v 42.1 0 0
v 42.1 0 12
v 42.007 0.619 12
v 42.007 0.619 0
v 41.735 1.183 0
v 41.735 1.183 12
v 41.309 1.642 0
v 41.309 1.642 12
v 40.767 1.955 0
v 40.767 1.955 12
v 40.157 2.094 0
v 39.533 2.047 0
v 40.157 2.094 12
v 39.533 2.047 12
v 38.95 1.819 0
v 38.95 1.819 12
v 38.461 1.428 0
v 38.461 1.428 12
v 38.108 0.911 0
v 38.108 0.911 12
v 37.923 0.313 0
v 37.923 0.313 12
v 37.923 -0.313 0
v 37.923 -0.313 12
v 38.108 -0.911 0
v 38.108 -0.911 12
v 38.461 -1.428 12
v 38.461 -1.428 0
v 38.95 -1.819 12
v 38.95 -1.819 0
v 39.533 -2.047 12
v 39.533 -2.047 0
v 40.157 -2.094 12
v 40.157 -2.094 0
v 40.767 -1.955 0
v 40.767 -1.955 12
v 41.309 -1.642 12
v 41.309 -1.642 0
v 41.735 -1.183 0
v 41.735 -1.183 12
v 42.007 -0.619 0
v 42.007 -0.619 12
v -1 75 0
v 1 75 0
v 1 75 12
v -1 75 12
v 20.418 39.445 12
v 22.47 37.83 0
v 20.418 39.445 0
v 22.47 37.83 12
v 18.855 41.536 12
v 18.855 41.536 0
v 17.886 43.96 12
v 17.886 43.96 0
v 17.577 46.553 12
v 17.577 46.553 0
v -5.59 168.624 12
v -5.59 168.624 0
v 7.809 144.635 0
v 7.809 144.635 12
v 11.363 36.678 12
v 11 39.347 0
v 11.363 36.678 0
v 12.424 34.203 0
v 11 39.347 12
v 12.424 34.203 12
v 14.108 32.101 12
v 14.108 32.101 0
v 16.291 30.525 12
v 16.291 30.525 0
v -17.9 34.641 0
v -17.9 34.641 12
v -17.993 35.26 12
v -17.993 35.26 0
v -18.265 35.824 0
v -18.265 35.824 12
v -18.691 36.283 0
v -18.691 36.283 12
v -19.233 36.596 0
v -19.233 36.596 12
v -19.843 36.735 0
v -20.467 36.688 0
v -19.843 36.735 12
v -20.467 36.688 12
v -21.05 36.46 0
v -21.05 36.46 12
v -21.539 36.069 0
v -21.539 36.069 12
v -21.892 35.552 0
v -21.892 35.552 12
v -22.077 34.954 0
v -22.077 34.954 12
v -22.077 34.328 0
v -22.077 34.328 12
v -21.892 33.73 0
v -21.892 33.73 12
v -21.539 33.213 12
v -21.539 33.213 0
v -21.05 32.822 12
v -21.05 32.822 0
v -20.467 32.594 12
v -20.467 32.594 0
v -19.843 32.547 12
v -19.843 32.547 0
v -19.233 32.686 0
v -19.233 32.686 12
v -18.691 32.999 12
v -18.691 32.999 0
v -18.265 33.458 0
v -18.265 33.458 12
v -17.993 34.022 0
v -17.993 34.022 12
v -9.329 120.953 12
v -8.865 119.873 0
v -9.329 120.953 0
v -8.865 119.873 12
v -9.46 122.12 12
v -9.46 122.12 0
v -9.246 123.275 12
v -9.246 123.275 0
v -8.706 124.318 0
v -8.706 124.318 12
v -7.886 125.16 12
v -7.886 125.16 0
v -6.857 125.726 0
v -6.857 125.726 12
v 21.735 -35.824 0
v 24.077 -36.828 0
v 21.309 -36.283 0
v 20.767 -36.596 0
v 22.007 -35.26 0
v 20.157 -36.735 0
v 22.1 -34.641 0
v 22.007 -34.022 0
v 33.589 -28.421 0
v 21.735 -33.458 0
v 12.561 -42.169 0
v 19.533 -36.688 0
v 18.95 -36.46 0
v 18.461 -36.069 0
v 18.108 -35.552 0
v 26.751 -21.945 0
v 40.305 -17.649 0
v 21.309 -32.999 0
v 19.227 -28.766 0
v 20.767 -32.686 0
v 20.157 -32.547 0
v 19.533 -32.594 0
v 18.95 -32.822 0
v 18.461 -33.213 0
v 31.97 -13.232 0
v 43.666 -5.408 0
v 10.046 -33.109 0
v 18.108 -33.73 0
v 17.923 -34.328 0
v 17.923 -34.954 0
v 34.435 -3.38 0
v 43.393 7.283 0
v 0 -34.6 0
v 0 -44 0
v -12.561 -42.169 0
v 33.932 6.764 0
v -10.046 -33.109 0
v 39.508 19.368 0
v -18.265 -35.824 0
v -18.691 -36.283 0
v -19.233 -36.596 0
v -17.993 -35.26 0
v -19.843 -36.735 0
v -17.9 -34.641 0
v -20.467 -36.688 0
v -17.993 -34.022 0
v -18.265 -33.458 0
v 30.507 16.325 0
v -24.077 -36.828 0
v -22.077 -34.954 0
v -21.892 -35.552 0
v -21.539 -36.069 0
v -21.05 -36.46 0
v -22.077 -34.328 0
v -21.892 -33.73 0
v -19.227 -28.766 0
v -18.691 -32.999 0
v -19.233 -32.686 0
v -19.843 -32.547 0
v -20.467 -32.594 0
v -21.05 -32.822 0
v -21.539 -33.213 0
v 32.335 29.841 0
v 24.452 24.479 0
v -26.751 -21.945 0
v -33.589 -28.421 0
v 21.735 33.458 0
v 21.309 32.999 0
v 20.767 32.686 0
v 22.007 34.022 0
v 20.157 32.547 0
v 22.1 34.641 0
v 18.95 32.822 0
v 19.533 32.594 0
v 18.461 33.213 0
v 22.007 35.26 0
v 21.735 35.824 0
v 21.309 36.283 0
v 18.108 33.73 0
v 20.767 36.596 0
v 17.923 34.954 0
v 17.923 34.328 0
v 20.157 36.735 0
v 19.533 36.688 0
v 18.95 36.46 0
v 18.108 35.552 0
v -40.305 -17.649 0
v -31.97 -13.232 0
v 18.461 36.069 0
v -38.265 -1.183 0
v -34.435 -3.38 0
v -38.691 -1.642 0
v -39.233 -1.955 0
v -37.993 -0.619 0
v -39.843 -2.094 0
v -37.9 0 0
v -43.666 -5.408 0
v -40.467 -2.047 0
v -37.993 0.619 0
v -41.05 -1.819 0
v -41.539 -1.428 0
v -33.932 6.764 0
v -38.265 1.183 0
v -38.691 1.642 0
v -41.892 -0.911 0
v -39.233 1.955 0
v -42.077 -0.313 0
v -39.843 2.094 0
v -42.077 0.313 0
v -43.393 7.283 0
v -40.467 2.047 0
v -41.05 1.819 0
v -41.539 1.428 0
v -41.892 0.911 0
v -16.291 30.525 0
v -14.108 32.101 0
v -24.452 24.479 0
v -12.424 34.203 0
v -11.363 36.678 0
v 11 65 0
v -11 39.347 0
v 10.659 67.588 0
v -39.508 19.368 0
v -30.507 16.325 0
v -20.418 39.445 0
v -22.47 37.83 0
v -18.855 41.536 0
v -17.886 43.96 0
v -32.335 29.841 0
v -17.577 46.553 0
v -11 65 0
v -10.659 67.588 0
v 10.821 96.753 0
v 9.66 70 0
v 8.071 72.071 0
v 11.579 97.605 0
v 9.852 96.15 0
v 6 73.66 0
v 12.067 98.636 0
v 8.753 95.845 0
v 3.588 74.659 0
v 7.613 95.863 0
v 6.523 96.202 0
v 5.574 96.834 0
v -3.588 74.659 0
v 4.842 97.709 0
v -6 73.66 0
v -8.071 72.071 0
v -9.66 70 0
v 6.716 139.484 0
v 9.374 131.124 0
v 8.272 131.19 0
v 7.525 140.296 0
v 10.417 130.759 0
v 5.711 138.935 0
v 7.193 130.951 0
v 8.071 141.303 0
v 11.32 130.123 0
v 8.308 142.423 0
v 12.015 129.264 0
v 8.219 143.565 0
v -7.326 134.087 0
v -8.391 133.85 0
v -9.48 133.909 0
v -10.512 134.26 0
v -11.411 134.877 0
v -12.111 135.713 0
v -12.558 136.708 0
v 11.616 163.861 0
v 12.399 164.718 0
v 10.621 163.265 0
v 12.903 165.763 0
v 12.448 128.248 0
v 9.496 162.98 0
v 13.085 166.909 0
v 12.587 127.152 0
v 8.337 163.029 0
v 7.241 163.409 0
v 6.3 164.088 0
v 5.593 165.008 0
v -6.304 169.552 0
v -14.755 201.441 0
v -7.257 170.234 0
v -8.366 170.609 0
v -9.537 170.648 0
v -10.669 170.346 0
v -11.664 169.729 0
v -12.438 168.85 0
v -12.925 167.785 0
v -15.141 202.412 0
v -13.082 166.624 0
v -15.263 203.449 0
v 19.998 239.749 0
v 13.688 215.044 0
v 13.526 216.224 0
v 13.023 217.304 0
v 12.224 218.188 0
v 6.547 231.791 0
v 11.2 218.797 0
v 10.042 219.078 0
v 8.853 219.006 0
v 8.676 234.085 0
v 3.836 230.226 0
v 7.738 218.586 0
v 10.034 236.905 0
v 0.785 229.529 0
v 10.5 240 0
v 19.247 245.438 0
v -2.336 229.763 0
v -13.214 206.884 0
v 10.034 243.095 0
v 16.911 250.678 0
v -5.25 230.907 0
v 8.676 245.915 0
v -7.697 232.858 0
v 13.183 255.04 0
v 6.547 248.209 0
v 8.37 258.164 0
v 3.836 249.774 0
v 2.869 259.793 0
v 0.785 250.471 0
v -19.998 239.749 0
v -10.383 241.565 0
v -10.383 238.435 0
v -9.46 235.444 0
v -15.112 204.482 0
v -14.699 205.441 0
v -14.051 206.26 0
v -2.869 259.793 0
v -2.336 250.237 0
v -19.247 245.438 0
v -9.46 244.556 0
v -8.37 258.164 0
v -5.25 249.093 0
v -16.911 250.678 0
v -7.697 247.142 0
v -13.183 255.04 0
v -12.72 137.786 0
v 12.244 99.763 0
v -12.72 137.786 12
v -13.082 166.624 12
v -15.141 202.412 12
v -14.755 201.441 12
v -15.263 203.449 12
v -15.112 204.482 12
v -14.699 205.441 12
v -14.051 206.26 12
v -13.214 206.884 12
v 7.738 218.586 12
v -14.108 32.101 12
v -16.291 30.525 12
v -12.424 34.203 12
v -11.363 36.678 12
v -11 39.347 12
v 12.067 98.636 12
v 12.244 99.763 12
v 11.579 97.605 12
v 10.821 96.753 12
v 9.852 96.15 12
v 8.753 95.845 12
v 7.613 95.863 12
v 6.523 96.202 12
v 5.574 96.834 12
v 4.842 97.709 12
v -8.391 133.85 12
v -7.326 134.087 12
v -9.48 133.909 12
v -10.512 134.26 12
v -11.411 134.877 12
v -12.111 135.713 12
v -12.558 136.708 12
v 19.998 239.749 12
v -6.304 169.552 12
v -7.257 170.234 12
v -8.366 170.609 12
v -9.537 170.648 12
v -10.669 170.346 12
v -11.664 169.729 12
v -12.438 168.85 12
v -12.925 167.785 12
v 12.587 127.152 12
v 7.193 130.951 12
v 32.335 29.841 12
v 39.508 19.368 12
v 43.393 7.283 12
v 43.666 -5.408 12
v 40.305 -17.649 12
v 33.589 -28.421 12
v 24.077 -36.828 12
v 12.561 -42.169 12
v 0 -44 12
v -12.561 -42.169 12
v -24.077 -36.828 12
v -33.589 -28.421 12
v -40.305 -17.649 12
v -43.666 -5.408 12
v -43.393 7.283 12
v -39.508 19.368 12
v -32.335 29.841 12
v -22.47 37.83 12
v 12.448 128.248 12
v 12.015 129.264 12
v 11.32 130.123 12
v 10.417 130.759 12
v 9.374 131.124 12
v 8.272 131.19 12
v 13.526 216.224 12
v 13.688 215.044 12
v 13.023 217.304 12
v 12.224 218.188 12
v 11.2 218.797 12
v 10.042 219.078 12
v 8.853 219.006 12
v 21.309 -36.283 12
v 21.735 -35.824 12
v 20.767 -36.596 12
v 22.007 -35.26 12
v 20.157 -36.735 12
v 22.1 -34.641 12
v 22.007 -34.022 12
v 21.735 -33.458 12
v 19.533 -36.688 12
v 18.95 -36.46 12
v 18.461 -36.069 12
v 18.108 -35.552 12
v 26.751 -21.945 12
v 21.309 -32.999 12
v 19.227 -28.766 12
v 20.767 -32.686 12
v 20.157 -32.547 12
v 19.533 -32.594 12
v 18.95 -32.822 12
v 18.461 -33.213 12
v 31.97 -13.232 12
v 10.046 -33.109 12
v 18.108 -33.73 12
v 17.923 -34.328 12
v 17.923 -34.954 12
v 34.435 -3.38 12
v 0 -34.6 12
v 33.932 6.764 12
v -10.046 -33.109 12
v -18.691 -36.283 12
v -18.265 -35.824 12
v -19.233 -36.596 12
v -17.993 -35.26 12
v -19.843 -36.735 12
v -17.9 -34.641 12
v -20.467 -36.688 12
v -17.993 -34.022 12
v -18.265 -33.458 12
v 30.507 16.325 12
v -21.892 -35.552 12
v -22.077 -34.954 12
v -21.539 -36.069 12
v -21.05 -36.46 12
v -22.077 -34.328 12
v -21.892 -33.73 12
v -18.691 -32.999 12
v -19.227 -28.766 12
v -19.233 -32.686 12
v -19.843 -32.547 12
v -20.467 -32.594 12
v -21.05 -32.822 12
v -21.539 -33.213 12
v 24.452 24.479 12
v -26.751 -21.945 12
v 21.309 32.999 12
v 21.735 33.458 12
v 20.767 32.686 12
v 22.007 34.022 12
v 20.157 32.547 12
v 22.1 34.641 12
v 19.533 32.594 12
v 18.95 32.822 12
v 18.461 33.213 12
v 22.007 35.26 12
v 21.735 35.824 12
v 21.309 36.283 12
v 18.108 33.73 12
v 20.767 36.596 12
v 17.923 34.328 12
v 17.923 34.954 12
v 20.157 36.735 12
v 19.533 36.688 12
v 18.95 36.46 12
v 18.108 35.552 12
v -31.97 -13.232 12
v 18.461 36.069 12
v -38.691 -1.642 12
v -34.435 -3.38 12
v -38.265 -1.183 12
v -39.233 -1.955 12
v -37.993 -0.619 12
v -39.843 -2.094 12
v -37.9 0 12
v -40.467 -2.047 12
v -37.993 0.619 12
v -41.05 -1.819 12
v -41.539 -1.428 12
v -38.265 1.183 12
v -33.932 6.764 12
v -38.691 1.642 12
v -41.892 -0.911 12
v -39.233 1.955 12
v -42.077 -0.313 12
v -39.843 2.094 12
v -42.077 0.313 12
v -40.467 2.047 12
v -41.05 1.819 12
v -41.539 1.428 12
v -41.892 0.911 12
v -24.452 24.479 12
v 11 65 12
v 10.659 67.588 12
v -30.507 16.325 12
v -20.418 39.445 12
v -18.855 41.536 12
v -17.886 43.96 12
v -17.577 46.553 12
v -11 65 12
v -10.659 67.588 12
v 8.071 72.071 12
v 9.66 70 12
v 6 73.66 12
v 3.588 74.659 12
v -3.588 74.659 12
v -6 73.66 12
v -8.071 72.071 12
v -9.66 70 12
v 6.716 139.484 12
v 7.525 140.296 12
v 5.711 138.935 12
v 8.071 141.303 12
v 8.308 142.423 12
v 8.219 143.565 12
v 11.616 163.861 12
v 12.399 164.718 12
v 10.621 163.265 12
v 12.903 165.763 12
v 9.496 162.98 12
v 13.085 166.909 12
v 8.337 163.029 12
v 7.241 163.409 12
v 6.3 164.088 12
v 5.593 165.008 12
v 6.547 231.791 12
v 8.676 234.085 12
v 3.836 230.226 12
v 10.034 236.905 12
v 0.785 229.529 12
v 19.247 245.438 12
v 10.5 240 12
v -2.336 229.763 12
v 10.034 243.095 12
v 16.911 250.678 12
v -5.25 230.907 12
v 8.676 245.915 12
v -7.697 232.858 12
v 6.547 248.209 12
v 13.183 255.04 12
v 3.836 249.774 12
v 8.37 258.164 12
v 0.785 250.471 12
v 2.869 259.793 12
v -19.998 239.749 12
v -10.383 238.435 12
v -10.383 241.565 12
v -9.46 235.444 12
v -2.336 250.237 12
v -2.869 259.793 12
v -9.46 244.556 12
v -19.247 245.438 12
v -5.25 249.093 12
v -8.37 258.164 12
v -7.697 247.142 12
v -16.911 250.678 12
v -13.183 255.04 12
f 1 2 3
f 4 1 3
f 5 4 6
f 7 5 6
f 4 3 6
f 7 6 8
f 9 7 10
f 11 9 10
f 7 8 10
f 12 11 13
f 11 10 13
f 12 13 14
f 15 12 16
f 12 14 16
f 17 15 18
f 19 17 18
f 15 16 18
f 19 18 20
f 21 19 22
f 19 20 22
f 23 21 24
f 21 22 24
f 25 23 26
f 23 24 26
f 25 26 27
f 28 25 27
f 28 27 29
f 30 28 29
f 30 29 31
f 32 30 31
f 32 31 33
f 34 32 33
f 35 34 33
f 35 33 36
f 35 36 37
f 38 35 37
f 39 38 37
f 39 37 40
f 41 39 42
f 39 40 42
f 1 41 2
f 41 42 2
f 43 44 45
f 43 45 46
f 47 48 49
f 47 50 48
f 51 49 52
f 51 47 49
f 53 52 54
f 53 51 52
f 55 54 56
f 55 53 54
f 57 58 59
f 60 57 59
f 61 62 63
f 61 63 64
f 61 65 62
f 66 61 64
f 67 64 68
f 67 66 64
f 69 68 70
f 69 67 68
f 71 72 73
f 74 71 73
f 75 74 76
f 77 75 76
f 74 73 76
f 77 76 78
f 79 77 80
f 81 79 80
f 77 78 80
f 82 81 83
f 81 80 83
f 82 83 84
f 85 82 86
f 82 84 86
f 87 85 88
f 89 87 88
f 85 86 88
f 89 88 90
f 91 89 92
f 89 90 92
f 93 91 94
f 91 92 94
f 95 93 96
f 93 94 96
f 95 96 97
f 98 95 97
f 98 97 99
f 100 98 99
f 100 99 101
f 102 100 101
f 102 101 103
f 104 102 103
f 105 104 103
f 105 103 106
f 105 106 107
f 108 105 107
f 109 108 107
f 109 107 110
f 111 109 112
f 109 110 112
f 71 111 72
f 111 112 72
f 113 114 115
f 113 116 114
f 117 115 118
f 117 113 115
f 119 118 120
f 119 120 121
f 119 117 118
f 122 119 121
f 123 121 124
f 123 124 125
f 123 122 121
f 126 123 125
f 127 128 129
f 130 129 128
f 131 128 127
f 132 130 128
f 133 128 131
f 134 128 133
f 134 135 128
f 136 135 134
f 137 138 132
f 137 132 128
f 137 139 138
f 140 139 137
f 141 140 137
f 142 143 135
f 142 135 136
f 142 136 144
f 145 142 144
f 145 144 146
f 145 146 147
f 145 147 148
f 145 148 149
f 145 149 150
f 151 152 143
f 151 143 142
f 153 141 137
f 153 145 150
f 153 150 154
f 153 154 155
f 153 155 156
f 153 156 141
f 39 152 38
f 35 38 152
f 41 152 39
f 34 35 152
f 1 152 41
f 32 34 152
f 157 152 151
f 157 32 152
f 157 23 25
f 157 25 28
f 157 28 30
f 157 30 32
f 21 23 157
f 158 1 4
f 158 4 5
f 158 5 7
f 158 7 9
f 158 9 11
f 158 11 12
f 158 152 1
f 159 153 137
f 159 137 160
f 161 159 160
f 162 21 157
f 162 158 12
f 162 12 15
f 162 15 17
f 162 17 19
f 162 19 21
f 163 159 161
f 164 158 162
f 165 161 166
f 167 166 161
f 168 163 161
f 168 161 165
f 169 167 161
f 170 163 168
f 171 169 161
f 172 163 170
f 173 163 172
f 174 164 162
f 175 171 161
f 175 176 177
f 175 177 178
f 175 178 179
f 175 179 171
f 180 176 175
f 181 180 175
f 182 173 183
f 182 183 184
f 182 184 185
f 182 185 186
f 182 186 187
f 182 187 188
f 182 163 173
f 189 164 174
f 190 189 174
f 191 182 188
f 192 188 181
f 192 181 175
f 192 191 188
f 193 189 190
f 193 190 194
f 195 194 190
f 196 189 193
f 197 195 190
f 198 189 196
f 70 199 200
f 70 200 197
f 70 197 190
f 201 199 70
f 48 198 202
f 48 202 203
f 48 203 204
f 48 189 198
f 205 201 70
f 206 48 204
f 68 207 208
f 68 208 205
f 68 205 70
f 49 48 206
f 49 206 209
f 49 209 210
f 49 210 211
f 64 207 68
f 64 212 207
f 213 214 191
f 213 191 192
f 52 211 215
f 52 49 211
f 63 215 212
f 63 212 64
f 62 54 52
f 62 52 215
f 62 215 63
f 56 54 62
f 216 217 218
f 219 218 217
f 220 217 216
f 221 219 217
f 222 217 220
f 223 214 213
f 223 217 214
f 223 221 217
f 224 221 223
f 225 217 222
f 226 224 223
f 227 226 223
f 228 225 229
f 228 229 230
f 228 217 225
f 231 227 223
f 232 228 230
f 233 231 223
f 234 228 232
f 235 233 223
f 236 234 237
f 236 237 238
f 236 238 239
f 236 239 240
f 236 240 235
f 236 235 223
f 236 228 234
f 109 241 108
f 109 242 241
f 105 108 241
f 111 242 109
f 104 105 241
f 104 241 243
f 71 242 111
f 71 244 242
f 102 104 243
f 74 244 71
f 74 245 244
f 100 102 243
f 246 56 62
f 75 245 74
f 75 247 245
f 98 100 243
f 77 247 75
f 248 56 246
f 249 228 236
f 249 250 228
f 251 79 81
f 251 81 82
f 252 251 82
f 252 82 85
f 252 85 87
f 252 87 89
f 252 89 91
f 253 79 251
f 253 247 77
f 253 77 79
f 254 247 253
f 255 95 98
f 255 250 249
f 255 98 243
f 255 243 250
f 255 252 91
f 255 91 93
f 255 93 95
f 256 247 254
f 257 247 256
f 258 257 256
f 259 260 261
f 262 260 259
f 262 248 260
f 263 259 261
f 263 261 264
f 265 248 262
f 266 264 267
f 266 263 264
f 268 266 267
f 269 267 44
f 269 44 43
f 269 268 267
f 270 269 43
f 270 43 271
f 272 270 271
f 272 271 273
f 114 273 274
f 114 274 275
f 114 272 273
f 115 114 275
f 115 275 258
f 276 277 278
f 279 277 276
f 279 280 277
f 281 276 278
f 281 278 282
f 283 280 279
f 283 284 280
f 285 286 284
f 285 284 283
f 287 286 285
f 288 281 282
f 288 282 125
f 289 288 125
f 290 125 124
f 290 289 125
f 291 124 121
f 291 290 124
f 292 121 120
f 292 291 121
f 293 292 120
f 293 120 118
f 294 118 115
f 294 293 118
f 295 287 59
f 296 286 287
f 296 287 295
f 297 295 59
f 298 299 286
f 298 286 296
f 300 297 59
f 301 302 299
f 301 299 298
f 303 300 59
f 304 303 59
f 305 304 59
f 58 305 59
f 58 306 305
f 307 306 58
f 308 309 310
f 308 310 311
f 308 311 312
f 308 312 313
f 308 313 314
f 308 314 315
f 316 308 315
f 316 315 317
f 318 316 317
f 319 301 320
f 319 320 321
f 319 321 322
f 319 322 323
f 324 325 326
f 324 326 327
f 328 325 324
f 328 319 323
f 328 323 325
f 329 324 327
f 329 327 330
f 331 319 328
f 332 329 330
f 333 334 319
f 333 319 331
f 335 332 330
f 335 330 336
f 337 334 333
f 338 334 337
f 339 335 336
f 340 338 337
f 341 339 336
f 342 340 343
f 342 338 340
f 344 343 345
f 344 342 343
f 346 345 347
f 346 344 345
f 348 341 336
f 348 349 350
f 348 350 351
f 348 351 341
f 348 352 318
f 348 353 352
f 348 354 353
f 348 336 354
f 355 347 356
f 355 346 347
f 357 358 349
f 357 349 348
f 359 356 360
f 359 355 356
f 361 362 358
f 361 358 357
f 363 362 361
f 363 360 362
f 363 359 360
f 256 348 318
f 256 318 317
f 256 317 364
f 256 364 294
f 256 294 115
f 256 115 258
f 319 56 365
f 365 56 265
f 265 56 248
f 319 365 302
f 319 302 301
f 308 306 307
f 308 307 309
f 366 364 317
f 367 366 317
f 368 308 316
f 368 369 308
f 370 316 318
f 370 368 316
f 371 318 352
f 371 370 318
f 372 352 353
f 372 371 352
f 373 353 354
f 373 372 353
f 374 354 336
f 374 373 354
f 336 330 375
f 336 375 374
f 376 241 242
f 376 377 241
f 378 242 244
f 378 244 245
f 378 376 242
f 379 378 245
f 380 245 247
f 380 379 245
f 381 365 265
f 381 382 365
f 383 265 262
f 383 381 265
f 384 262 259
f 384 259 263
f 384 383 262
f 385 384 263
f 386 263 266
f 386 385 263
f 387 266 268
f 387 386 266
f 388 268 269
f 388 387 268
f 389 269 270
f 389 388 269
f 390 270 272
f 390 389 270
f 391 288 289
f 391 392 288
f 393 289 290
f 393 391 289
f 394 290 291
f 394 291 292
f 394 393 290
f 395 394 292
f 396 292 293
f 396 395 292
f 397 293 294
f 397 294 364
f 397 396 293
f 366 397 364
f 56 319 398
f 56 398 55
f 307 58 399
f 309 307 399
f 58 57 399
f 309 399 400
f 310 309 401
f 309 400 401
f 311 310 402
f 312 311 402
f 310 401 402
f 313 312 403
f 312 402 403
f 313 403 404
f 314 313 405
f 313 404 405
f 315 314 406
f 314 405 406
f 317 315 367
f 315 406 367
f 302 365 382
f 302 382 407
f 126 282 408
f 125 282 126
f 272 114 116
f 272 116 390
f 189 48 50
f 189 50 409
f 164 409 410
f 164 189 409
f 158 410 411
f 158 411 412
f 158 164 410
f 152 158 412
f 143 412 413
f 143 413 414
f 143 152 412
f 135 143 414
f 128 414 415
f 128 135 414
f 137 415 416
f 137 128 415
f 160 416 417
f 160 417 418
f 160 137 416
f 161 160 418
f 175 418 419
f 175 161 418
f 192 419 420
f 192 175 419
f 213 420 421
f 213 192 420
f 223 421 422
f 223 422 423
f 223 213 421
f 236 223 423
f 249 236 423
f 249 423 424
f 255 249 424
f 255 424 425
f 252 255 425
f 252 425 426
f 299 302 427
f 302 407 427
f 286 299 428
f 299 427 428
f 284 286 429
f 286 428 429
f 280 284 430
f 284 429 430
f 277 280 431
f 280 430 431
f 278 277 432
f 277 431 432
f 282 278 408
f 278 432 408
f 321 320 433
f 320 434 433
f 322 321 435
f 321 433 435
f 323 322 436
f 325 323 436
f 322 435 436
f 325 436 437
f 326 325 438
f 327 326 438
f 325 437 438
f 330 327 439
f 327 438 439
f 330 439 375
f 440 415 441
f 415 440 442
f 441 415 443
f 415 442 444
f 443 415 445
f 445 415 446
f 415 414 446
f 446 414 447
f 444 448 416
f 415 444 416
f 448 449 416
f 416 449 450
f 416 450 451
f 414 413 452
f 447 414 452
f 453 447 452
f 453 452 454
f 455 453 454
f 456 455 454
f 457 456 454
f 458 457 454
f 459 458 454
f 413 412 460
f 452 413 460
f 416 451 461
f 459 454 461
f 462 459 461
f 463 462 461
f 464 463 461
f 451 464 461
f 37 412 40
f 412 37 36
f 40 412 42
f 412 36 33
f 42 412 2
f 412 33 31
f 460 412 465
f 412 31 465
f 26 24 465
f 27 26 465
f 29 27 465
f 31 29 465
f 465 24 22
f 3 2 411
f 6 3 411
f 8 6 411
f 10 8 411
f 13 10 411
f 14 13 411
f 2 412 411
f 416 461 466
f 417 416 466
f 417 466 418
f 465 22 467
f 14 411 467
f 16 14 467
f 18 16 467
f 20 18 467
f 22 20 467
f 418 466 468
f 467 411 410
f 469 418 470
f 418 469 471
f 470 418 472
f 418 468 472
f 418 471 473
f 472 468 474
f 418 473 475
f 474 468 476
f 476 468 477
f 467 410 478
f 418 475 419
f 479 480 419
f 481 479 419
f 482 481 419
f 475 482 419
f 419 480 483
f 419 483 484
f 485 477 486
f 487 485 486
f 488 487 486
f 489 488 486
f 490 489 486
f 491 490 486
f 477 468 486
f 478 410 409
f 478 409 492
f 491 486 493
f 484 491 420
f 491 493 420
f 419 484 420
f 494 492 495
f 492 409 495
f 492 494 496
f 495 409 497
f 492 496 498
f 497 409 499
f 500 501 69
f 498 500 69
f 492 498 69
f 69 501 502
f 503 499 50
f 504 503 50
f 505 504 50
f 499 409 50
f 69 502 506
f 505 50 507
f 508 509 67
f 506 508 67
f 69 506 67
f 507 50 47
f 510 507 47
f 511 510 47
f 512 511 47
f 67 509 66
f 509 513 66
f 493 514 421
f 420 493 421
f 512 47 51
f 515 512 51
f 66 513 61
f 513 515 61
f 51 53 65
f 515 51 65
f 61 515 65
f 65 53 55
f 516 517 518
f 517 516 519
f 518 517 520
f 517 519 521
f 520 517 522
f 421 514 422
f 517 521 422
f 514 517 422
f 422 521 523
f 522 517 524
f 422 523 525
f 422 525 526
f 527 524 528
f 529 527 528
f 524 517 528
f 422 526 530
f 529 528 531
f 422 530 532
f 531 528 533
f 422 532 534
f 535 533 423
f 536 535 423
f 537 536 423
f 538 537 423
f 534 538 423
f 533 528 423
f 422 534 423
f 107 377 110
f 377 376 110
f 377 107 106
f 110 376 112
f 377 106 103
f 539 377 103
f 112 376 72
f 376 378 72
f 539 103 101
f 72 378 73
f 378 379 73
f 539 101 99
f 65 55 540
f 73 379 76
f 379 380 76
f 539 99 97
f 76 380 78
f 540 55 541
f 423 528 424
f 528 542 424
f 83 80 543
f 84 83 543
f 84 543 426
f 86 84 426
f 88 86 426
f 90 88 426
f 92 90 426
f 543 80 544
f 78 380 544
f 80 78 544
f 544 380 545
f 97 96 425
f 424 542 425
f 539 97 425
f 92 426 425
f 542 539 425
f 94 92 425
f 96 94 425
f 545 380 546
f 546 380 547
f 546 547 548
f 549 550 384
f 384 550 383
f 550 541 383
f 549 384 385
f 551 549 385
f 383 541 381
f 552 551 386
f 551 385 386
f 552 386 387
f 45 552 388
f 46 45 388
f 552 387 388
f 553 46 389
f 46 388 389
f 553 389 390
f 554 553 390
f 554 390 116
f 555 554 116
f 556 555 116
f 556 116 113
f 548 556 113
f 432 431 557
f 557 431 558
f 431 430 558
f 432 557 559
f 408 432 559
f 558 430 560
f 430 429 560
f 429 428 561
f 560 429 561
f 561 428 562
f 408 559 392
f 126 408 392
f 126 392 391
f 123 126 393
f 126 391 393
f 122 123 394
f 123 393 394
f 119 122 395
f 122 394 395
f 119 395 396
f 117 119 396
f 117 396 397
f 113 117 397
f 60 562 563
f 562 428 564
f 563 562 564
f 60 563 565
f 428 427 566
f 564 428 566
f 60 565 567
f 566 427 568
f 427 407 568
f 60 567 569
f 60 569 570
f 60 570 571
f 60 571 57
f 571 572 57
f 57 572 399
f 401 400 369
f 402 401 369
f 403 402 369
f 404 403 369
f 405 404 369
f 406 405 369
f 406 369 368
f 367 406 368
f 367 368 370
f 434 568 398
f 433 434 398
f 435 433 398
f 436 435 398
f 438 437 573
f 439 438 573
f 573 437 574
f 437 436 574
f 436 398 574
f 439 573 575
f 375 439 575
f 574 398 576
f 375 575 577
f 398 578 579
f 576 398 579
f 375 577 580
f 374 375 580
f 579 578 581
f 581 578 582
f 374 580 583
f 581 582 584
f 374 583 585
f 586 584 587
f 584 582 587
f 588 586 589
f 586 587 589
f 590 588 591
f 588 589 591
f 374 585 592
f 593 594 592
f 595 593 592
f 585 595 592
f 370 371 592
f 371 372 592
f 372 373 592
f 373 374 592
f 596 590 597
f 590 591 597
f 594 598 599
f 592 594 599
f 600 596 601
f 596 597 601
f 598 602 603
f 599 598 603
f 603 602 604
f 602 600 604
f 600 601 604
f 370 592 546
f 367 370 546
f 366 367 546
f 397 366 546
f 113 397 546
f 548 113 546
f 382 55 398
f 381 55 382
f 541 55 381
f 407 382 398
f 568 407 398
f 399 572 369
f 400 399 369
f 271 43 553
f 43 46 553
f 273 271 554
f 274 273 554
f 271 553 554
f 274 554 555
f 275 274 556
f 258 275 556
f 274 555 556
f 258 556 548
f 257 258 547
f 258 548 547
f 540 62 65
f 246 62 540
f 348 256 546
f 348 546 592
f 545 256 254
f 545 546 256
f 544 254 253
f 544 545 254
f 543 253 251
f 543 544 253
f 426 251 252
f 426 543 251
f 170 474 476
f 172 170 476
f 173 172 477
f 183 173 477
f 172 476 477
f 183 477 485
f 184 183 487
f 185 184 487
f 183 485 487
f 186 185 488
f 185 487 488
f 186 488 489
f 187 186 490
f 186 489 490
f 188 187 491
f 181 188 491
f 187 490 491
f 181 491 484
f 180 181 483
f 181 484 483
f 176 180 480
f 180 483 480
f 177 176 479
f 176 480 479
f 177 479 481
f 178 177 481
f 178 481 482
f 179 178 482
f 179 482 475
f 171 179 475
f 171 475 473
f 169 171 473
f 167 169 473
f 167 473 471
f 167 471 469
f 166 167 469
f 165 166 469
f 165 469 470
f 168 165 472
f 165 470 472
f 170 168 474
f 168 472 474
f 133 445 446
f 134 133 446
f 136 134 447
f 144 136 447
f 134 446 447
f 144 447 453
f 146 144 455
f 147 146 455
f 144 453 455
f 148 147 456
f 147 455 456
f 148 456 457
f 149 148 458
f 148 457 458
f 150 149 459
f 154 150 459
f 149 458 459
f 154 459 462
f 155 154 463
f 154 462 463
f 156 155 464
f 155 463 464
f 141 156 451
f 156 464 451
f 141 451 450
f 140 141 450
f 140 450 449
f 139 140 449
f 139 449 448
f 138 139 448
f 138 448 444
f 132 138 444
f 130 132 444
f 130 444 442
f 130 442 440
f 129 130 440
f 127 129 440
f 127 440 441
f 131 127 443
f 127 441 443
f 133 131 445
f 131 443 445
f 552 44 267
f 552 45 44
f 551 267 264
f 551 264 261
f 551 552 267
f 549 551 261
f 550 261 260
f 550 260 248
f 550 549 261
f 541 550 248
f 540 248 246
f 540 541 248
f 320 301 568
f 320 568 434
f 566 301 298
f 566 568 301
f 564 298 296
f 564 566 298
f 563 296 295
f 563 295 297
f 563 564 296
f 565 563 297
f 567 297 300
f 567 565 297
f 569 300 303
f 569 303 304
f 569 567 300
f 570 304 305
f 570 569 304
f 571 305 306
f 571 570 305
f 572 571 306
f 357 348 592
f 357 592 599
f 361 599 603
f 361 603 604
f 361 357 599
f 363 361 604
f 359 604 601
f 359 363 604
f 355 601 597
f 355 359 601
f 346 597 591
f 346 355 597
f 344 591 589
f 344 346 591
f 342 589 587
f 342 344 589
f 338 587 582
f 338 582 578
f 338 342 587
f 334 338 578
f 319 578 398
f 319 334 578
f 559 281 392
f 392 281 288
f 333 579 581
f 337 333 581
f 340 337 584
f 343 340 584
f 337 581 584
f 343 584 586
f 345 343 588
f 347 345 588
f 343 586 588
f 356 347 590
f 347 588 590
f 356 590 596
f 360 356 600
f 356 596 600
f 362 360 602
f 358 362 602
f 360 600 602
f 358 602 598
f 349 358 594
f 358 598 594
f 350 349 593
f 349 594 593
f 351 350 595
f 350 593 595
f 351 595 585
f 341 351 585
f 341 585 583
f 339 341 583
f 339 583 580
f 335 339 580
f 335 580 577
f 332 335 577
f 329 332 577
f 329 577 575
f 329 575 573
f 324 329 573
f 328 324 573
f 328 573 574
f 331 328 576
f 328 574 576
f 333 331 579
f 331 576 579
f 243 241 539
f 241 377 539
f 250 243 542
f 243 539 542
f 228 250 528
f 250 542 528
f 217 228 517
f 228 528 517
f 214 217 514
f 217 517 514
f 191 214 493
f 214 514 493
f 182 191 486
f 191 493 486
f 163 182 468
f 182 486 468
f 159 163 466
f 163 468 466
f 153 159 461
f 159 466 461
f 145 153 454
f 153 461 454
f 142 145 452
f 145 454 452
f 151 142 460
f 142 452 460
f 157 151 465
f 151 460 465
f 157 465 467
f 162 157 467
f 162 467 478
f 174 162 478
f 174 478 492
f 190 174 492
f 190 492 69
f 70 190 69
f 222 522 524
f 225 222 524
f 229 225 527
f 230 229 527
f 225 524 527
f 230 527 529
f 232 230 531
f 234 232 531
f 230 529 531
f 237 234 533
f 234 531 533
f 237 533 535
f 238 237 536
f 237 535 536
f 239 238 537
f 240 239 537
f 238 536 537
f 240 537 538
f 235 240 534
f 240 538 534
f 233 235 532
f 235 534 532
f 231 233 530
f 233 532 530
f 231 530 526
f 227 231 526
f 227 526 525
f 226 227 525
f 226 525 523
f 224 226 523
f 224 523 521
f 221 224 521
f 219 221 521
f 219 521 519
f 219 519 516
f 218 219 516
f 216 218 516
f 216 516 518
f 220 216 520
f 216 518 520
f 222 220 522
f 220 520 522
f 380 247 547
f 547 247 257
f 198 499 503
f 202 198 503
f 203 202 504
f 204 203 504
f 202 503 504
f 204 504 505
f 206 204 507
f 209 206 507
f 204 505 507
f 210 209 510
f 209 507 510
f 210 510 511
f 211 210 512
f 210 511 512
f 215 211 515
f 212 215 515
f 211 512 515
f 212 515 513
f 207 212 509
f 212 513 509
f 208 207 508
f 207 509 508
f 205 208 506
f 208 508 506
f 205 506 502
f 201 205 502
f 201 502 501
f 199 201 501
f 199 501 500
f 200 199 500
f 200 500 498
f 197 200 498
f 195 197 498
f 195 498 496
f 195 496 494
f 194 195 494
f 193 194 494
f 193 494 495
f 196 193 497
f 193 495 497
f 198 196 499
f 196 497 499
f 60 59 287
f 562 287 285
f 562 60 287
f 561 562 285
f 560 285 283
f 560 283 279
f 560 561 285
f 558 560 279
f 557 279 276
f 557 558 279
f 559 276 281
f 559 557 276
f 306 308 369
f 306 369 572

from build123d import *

# Parameters (mm, degrees)
EXTRUDE_1_DEPTH     = 12
SKETCH_2_R          = 10.5
SKETCH_2_R_2        = 34.6
SKETCH_2_R_3        = 2.1
CUT_EXTRUDE_1_DEPTH = 12
FILLET_1_R          = 10
SKETCH_3_W          = 22
SKETCH_3_H          = 50
CUT_EXTRUDE_2_DEPTH = 12
FILLET_2_R          = 10
CUT_EXTRUDE_3_DEPTH = 264.96969523
FILLET_4_R          = 4


with BuildPart() as part:
    # 草图1 → 凸台-拉伸1 (new body)
    with BuildSketch(Plane.XY):
        with BuildLine():
            Line((-17.5, 40.370162249), (-19.998429914, 239.749398802))
            ThreePointArc((-19.998429914, 239.749398802), (0, 260), (19.998429914, 239.749398802))
            Line((19.998429914, 239.749398802), (17.5, 40.370162249))
            ThreePointArc((17.5, 40.370162249), (0, -44), (-17.5, 40.370162249))
        make_face()
    extrude(amount=EXTRUDE_1_DEPTH)

    # 草图2 → 切除-拉伸1 (cut)
    with BuildSketch(Plane.XY.offset(12)):
        with Locations((0, 240)):
            Circle(SKETCH_2_R)
        Circle(SKETCH_2_R_2)
        with Locations((20, 34.641016151)):
            Circle(SKETCH_2_R_3)
        with Locations((40, 0)):
            Circle(SKETCH_2_R_3)
        with Locations((20, -34.641016151)):
            Circle(SKETCH_2_R_3)
        with Locations((-20, -34.641016151)):
            Circle(SKETCH_2_R_3)
        with Locations((-40, 0)):
            Circle(SKETCH_2_R_3)
        with Locations((-20, 34.641016151)):
            Circle(SKETCH_2_R_3)
    extrude(amount=-CUT_EXTRUDE_1_DEPTH, mode=Mode.SUBTRACT)

    # 圆角1
    fillet_1_edges = [part.edges().sort_by_distance(p)[0] for p in [
        (-17.5, 40.370162249, 6),
        (17.5, 40.370162249, 6),
    ]]
    fillet(fillet_1_edges, radius=FILLET_1_R)

    # 草图3 → 切除-拉伸2 (cut)
    with BuildSketch(Plane(origin=(0, 0, 0), x_dir=(-1, 0, 0), z_dir=(0, 0, -1))):
        with Locations((0, 50)):
            Rectangle(SKETCH_3_W, SKETCH_3_H)
    extrude(amount=-CUT_EXTRUDE_2_DEPTH, mode=Mode.SUBTRACT)

    # 圆角2
    fillet_2_edges = [part.edges().sort_by_distance(p)[0] for p in [
        (-11, 32.804877686, 6),
        (11, 32.804877686, 6),
        (-11, 75, 6),
        (11, 75, 6),
    ]]
    fillet(fillet_2_edges, radius=FILLET_2_R)

    # 草图5 → 切除-拉伸3 (cut, through all)
    with BuildSketch(Plane(origin=(0, 0, 0), x_dir=(-1, 0, 0), z_dir=(0, 0, -1))):
        Polygon((-13.775012743, 221.957895182), (16.705979035, 204.93348865), (-12.897497215, 151.930565202), align=None)
        Polygon((13.279210594, 182.391984789), (-10.08410037, 140.561634461), (12.649095231, 132.107636495), align=None)
        Polygon((-12.660080973, 132.98431864), (11.431866329, 124.025029456), (-12.071548884, 86.018390981), align=None)
    extrude(amount=-CUT_EXTRUDE_3_DEPTH, mode=Mode.SUBTRACT)

    # 圆角4
    fillet_4_edges = [part.edges().sort_by_distance(p)[0] for p in [
        (-13.279210594, 182.391984789, 6),
        (-12.649095231, 132.107636495, 6),
        (10.08410037, 140.561634461, 6),
        (12.071548884, 86.018390981, 6),
        (12.660080973, 132.98431864, 6),
        (-11.431866329, 124.025029456, 6),
        (12.897497215, 151.930565202, 6),
        (13.775012743, 221.957895182, 6),
        (-16.705979035, 204.93348865, 6),
    ]]
    fillet(fillet_4_edges, radius=FILLET_4_R)


solid = part.part
